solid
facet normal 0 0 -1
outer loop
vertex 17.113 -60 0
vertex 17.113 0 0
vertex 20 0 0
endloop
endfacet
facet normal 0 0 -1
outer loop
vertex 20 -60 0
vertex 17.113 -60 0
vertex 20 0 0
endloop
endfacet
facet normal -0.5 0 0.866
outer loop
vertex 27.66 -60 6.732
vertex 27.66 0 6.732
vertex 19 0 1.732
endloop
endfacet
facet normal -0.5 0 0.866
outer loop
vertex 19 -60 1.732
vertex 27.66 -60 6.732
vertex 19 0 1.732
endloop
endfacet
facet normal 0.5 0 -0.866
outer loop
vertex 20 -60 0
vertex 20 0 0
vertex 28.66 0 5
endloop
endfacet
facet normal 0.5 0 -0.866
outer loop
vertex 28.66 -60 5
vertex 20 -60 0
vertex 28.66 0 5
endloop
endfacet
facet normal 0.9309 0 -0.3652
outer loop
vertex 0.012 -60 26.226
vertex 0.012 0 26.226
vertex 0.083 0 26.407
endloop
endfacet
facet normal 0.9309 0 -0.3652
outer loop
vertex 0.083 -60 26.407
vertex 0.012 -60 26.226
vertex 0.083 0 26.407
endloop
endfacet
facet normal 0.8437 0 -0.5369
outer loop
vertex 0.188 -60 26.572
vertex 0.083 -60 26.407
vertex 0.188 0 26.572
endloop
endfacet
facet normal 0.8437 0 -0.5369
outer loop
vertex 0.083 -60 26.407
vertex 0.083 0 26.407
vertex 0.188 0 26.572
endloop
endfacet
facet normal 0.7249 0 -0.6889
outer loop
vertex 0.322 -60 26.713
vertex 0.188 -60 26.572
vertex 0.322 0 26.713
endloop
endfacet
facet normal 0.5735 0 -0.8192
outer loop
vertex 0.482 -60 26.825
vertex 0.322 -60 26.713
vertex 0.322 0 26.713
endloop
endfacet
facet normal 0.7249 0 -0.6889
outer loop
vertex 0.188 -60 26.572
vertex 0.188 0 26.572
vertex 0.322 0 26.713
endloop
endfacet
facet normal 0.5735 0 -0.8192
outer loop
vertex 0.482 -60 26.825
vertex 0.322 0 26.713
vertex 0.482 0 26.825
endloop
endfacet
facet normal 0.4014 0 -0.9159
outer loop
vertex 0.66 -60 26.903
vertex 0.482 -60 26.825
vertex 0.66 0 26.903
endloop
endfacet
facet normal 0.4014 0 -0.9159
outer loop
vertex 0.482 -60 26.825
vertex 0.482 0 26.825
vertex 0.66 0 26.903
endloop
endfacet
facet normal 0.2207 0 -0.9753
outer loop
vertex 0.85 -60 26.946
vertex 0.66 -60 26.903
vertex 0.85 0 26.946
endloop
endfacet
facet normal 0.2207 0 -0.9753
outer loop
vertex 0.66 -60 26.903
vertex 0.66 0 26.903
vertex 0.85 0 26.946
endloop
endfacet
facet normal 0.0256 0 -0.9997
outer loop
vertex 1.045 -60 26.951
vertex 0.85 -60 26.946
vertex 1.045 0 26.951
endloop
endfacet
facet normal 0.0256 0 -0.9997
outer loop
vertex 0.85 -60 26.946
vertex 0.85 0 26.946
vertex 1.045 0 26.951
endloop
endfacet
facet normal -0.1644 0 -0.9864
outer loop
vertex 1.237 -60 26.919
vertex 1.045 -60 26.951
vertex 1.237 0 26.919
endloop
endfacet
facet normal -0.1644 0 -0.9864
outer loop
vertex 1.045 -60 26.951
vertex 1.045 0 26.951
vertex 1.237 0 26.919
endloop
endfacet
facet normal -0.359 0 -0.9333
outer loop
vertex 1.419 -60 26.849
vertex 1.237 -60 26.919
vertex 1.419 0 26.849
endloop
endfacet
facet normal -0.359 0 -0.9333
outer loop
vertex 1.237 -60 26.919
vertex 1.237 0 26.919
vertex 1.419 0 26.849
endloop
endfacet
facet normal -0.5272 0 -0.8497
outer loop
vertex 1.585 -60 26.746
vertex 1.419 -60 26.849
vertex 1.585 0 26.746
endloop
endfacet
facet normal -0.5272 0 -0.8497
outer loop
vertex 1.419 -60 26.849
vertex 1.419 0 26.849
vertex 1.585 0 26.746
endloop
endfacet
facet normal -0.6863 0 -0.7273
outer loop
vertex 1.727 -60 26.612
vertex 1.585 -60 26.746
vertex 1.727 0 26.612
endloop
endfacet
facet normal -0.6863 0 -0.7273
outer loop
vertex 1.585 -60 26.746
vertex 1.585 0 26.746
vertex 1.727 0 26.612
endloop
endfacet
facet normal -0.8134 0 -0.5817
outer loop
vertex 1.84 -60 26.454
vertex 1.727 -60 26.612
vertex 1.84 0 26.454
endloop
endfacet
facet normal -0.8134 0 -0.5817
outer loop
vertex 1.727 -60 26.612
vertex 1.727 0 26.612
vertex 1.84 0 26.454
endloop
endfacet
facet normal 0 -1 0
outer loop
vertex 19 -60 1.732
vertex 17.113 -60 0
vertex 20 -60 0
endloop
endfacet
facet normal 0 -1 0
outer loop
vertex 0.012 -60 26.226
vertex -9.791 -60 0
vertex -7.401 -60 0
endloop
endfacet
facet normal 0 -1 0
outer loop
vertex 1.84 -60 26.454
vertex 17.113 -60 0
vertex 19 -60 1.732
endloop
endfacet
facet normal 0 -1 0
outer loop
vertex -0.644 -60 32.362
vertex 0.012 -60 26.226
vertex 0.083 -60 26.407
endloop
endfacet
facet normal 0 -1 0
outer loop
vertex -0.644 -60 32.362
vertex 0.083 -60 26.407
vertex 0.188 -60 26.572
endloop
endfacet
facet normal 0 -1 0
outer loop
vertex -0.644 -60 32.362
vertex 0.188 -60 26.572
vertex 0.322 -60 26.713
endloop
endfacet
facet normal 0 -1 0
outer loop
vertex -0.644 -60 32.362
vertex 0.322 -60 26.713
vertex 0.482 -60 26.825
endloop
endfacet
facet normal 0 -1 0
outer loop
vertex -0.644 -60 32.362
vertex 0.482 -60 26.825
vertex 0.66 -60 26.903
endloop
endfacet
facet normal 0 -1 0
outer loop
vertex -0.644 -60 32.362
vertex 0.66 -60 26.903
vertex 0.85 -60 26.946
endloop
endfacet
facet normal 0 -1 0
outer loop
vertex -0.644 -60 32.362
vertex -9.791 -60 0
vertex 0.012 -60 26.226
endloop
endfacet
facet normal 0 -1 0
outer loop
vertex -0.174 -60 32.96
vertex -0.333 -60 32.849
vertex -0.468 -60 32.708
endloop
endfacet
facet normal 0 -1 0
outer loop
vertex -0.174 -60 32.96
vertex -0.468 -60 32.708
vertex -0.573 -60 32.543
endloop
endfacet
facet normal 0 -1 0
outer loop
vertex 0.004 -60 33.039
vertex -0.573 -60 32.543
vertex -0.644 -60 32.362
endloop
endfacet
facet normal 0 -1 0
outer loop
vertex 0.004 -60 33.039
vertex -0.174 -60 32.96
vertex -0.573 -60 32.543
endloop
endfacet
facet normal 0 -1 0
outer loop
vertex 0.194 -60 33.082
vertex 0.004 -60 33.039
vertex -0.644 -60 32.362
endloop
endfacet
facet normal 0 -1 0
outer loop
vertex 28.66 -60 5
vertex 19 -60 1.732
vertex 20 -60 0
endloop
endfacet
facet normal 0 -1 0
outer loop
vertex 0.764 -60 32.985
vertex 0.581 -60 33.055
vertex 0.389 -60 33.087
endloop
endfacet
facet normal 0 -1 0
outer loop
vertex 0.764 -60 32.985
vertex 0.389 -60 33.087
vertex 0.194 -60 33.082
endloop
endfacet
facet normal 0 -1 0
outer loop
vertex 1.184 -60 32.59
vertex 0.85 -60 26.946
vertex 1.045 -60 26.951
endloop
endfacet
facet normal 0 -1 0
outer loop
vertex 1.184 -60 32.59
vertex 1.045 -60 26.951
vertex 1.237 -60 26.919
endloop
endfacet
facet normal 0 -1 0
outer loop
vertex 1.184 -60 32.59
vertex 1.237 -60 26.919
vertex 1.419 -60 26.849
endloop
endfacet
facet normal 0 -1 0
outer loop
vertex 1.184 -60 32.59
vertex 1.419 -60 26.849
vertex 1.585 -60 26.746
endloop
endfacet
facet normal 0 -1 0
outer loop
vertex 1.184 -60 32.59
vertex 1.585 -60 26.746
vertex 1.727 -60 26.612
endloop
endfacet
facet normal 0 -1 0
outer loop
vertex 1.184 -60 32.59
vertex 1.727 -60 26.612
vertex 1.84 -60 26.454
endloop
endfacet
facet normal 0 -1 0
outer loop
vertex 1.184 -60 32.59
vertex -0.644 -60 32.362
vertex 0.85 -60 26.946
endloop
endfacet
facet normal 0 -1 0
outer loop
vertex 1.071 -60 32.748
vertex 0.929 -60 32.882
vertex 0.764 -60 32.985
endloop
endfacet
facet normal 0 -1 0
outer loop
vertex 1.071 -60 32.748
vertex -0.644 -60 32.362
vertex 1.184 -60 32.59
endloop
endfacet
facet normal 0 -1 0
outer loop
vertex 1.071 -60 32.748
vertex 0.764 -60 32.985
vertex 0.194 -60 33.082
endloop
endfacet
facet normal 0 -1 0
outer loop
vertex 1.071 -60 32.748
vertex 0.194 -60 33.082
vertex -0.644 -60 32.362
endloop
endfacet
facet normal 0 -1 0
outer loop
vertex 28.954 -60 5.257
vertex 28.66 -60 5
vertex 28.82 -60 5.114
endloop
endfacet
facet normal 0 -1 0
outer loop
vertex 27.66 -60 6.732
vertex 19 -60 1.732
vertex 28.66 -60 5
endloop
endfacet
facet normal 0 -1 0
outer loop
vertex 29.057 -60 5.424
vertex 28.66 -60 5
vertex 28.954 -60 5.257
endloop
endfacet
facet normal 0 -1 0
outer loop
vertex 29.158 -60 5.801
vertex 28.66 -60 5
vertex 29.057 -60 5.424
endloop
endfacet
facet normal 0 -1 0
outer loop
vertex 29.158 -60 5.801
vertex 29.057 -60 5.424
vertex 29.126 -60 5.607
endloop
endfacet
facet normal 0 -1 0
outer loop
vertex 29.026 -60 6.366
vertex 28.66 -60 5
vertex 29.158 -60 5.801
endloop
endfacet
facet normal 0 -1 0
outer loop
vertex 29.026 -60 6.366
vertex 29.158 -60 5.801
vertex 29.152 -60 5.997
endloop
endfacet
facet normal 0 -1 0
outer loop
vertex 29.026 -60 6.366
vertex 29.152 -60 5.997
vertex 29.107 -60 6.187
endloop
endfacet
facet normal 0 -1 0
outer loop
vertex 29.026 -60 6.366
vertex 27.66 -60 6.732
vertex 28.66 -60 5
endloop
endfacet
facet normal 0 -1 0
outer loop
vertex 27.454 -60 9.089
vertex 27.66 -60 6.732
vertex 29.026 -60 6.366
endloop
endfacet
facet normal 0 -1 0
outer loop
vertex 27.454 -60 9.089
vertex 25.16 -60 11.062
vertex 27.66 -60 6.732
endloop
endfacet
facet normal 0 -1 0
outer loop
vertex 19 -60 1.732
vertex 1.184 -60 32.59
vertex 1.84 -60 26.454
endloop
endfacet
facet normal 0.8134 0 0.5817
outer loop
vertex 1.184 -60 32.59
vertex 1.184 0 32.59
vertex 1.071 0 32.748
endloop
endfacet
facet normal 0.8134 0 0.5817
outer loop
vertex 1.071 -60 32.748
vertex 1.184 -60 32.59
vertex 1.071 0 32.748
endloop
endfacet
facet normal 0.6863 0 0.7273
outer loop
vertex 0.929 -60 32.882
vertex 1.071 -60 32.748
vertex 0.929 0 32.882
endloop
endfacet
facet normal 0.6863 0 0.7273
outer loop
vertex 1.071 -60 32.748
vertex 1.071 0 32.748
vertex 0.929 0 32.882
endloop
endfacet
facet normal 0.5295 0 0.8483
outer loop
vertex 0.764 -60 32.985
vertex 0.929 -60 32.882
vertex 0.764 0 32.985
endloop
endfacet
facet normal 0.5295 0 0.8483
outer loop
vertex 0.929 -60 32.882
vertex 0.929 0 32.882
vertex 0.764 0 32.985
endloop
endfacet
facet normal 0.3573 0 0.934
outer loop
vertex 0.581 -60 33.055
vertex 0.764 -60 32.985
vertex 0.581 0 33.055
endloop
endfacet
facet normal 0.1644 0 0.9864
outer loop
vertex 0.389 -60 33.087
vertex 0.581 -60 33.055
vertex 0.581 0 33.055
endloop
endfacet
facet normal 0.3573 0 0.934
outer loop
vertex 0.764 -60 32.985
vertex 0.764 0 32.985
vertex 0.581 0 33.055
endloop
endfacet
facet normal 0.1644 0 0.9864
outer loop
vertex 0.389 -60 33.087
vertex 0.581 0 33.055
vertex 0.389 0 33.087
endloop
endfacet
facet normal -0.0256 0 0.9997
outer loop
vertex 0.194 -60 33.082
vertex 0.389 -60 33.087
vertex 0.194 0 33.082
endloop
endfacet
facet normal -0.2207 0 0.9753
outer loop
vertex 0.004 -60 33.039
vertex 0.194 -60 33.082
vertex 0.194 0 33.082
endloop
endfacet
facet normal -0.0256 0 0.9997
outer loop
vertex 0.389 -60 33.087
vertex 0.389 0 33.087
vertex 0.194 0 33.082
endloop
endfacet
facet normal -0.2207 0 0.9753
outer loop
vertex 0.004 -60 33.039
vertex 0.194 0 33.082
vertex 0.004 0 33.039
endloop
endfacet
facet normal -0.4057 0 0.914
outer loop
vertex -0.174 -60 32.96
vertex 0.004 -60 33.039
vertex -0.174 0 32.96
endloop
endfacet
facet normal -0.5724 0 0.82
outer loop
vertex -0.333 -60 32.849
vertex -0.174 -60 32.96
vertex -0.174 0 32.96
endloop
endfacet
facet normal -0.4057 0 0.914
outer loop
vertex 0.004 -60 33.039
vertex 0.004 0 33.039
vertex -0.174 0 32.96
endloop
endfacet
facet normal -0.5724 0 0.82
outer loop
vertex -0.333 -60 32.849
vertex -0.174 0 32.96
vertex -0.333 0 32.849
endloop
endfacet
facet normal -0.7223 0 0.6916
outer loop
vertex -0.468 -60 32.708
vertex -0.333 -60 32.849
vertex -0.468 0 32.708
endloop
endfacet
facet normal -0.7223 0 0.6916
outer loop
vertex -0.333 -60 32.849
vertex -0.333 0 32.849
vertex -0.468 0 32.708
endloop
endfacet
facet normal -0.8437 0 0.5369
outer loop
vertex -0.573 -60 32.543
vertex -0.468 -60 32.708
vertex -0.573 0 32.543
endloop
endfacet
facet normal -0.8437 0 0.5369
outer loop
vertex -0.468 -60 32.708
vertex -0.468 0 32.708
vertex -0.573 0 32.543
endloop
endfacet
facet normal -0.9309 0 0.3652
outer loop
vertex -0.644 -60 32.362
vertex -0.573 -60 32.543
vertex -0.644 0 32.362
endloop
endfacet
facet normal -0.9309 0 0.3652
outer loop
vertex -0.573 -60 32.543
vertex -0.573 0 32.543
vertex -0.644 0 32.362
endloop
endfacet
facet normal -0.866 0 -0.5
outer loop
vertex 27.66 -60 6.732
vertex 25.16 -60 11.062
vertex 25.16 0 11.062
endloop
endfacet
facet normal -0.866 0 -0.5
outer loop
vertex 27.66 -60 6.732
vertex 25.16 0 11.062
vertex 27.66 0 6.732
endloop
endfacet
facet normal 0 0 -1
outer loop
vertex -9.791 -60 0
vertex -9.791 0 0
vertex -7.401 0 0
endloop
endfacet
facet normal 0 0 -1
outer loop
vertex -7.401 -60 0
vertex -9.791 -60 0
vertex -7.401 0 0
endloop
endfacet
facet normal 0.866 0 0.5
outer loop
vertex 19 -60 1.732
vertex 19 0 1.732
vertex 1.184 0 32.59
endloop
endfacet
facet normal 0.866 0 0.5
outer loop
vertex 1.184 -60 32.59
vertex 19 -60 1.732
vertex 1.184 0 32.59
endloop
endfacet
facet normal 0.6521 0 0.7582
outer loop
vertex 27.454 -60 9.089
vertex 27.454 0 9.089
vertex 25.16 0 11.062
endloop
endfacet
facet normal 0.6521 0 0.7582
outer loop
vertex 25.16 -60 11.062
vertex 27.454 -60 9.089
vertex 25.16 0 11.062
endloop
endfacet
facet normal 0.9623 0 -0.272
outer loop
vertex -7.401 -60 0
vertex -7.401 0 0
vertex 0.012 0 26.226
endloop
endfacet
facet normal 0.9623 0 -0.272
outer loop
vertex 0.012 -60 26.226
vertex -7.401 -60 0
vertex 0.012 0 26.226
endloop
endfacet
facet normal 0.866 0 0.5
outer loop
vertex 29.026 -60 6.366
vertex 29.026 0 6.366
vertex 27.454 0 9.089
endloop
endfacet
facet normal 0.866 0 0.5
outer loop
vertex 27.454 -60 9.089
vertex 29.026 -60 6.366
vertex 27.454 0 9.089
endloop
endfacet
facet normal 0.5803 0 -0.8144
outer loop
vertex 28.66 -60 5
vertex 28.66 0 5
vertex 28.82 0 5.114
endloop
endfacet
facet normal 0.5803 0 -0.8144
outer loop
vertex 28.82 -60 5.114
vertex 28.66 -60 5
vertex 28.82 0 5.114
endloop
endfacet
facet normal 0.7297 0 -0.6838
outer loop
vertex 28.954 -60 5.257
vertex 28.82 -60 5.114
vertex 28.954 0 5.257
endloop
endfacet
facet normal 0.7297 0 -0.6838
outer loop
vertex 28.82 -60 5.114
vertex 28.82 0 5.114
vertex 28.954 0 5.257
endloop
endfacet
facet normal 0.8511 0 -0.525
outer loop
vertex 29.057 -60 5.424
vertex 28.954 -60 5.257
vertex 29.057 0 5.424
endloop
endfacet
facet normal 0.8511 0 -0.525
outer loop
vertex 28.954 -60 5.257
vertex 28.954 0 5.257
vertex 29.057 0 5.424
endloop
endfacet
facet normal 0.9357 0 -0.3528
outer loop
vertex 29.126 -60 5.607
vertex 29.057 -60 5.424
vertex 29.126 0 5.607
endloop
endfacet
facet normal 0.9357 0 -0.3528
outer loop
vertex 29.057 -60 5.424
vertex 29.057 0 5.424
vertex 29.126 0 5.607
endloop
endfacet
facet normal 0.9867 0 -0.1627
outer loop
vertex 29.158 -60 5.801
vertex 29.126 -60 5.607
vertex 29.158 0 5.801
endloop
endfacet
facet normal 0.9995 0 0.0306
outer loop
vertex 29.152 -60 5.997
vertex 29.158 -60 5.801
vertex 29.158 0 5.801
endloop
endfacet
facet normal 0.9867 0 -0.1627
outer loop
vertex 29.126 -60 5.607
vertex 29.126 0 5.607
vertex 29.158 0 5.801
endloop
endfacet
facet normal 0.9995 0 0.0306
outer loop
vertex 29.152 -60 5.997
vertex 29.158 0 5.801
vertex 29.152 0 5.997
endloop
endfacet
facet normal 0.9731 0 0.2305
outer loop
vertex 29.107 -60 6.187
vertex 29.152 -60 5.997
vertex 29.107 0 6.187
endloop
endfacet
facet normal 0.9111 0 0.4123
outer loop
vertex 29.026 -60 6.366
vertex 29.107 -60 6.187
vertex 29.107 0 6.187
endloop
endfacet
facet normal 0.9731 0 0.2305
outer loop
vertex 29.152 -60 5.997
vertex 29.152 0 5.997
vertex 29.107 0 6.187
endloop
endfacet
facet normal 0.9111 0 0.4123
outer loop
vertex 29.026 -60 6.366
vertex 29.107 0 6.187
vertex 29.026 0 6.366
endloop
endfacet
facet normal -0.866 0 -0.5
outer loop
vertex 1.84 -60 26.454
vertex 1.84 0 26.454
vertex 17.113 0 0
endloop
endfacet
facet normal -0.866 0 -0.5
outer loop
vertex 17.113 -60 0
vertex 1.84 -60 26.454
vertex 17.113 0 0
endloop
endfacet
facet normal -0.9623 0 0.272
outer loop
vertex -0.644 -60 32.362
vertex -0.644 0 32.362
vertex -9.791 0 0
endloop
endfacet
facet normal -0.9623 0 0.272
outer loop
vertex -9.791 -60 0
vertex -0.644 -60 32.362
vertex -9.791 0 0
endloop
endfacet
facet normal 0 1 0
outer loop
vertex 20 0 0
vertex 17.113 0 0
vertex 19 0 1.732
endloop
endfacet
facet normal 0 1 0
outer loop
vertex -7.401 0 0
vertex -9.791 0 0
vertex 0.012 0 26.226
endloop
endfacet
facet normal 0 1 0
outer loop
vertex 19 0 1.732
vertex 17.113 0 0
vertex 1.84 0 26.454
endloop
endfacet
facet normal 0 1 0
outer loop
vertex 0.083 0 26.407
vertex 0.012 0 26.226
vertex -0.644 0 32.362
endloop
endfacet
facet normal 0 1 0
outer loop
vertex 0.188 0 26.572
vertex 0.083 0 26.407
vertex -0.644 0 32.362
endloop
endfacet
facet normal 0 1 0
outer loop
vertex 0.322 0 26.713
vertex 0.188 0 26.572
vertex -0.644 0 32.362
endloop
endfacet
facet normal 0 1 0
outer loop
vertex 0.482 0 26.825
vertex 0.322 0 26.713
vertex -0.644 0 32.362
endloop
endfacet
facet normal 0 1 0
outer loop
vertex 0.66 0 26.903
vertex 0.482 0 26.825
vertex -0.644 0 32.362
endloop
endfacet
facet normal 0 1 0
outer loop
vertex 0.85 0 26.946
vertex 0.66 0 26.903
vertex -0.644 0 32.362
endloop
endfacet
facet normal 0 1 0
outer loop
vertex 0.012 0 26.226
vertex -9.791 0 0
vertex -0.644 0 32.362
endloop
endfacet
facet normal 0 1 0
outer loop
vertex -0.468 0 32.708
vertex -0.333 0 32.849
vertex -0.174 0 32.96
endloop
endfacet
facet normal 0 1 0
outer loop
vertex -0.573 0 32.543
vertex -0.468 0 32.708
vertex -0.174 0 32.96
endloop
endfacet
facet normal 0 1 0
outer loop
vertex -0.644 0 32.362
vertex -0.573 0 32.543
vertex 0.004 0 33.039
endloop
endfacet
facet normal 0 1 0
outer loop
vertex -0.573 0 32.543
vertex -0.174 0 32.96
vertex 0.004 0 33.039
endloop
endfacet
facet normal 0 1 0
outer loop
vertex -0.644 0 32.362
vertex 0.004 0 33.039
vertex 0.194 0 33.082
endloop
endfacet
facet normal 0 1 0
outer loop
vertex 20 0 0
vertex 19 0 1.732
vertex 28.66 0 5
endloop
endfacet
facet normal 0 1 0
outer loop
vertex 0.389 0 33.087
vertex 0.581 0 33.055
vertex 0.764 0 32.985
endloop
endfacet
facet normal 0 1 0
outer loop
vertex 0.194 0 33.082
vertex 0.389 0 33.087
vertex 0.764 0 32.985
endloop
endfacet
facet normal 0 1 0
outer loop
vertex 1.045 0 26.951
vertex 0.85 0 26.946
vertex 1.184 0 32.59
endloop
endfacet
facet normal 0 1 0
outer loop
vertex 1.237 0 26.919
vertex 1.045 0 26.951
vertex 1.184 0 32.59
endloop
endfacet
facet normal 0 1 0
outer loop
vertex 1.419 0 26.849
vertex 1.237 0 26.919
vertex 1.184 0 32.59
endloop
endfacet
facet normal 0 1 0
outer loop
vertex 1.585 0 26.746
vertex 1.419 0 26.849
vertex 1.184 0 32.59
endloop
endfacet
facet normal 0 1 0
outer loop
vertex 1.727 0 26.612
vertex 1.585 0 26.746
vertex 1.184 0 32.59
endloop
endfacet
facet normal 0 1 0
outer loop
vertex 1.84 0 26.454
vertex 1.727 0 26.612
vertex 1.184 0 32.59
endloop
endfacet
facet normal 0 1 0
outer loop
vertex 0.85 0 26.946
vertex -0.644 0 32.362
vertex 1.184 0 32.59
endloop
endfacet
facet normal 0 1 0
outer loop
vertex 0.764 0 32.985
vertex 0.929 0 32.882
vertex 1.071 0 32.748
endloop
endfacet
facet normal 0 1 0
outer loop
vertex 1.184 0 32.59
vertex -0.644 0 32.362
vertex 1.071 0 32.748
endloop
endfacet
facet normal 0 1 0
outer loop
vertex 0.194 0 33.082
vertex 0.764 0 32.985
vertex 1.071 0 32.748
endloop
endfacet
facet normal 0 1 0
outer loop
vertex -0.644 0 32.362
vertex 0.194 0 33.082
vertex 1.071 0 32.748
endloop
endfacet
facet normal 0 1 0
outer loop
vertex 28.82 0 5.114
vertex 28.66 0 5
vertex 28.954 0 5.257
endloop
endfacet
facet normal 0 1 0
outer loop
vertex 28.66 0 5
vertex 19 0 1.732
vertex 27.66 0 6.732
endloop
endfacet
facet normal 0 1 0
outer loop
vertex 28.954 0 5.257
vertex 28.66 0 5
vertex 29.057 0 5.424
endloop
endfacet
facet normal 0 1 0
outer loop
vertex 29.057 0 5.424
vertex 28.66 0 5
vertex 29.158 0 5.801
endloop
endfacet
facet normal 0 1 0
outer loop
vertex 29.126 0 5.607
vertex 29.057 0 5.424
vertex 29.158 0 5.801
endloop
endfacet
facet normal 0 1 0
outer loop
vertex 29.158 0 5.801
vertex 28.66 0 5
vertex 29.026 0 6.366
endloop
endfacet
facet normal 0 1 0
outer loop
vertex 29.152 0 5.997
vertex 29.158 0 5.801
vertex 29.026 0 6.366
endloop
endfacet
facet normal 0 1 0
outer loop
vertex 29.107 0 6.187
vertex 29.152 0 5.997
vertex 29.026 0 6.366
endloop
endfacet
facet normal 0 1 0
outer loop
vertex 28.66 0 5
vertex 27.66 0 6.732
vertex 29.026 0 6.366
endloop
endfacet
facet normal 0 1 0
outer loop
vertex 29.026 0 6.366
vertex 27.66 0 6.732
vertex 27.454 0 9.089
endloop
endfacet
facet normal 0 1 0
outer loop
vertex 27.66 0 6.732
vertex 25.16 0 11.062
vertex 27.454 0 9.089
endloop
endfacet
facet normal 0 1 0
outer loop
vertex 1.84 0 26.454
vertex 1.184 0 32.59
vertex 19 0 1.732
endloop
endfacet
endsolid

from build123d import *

# Parameters (mm, degrees)
F1_DEPTH = 60


with BuildPart() as f1:
    # F0 (on Front) → F1 (new body)
    with BuildSketch(Plane.XZ):
        with BuildLine():
            Line((19, 1.732051), (1.18418, 32.589956))
            ThreePointArc((1.18418, 32.589956), (0.194399, 33.082269), (-0.644148, 32.361937))
            Line((-0.644148, 32.361937), (-9.790771, 0))
            Line((-9.790771, 0), (-7.40067, 0))
            Line((-7.40067, 0), (0.011709, 26.225959))
            ThreePointArc((0.011709, 26.225959), (0.850256, 26.946291), (1.840037, 26.453979))
            Line((1.840037, 26.453979), (17.113249, 0))
            Line((17.113249, 0), (20, 0))
            Line((20, 0), (19, 1.732051))
        make_face()
        with BuildLine():
            Line((27.660254, 6.732051), (19, 1.732051))
            Line((19, 1.732051), (20, 0))
            Line((20, 0), (28.660254, 5))
            ThreePointArc((28.660254, 5), (29.12618, 5.607206), (29.026279, 6.366025))
            Line((29.026279, 6.366025), (27.454006, 9.089284))
            Line((27.454006, 9.089284), (25.160254, 11.062178))
            Line((25.160254, 11.062178), (27.660254, 6.732051))
        make_face()
    extrude(amount=F1_DEPTH)


solid = f1.part
